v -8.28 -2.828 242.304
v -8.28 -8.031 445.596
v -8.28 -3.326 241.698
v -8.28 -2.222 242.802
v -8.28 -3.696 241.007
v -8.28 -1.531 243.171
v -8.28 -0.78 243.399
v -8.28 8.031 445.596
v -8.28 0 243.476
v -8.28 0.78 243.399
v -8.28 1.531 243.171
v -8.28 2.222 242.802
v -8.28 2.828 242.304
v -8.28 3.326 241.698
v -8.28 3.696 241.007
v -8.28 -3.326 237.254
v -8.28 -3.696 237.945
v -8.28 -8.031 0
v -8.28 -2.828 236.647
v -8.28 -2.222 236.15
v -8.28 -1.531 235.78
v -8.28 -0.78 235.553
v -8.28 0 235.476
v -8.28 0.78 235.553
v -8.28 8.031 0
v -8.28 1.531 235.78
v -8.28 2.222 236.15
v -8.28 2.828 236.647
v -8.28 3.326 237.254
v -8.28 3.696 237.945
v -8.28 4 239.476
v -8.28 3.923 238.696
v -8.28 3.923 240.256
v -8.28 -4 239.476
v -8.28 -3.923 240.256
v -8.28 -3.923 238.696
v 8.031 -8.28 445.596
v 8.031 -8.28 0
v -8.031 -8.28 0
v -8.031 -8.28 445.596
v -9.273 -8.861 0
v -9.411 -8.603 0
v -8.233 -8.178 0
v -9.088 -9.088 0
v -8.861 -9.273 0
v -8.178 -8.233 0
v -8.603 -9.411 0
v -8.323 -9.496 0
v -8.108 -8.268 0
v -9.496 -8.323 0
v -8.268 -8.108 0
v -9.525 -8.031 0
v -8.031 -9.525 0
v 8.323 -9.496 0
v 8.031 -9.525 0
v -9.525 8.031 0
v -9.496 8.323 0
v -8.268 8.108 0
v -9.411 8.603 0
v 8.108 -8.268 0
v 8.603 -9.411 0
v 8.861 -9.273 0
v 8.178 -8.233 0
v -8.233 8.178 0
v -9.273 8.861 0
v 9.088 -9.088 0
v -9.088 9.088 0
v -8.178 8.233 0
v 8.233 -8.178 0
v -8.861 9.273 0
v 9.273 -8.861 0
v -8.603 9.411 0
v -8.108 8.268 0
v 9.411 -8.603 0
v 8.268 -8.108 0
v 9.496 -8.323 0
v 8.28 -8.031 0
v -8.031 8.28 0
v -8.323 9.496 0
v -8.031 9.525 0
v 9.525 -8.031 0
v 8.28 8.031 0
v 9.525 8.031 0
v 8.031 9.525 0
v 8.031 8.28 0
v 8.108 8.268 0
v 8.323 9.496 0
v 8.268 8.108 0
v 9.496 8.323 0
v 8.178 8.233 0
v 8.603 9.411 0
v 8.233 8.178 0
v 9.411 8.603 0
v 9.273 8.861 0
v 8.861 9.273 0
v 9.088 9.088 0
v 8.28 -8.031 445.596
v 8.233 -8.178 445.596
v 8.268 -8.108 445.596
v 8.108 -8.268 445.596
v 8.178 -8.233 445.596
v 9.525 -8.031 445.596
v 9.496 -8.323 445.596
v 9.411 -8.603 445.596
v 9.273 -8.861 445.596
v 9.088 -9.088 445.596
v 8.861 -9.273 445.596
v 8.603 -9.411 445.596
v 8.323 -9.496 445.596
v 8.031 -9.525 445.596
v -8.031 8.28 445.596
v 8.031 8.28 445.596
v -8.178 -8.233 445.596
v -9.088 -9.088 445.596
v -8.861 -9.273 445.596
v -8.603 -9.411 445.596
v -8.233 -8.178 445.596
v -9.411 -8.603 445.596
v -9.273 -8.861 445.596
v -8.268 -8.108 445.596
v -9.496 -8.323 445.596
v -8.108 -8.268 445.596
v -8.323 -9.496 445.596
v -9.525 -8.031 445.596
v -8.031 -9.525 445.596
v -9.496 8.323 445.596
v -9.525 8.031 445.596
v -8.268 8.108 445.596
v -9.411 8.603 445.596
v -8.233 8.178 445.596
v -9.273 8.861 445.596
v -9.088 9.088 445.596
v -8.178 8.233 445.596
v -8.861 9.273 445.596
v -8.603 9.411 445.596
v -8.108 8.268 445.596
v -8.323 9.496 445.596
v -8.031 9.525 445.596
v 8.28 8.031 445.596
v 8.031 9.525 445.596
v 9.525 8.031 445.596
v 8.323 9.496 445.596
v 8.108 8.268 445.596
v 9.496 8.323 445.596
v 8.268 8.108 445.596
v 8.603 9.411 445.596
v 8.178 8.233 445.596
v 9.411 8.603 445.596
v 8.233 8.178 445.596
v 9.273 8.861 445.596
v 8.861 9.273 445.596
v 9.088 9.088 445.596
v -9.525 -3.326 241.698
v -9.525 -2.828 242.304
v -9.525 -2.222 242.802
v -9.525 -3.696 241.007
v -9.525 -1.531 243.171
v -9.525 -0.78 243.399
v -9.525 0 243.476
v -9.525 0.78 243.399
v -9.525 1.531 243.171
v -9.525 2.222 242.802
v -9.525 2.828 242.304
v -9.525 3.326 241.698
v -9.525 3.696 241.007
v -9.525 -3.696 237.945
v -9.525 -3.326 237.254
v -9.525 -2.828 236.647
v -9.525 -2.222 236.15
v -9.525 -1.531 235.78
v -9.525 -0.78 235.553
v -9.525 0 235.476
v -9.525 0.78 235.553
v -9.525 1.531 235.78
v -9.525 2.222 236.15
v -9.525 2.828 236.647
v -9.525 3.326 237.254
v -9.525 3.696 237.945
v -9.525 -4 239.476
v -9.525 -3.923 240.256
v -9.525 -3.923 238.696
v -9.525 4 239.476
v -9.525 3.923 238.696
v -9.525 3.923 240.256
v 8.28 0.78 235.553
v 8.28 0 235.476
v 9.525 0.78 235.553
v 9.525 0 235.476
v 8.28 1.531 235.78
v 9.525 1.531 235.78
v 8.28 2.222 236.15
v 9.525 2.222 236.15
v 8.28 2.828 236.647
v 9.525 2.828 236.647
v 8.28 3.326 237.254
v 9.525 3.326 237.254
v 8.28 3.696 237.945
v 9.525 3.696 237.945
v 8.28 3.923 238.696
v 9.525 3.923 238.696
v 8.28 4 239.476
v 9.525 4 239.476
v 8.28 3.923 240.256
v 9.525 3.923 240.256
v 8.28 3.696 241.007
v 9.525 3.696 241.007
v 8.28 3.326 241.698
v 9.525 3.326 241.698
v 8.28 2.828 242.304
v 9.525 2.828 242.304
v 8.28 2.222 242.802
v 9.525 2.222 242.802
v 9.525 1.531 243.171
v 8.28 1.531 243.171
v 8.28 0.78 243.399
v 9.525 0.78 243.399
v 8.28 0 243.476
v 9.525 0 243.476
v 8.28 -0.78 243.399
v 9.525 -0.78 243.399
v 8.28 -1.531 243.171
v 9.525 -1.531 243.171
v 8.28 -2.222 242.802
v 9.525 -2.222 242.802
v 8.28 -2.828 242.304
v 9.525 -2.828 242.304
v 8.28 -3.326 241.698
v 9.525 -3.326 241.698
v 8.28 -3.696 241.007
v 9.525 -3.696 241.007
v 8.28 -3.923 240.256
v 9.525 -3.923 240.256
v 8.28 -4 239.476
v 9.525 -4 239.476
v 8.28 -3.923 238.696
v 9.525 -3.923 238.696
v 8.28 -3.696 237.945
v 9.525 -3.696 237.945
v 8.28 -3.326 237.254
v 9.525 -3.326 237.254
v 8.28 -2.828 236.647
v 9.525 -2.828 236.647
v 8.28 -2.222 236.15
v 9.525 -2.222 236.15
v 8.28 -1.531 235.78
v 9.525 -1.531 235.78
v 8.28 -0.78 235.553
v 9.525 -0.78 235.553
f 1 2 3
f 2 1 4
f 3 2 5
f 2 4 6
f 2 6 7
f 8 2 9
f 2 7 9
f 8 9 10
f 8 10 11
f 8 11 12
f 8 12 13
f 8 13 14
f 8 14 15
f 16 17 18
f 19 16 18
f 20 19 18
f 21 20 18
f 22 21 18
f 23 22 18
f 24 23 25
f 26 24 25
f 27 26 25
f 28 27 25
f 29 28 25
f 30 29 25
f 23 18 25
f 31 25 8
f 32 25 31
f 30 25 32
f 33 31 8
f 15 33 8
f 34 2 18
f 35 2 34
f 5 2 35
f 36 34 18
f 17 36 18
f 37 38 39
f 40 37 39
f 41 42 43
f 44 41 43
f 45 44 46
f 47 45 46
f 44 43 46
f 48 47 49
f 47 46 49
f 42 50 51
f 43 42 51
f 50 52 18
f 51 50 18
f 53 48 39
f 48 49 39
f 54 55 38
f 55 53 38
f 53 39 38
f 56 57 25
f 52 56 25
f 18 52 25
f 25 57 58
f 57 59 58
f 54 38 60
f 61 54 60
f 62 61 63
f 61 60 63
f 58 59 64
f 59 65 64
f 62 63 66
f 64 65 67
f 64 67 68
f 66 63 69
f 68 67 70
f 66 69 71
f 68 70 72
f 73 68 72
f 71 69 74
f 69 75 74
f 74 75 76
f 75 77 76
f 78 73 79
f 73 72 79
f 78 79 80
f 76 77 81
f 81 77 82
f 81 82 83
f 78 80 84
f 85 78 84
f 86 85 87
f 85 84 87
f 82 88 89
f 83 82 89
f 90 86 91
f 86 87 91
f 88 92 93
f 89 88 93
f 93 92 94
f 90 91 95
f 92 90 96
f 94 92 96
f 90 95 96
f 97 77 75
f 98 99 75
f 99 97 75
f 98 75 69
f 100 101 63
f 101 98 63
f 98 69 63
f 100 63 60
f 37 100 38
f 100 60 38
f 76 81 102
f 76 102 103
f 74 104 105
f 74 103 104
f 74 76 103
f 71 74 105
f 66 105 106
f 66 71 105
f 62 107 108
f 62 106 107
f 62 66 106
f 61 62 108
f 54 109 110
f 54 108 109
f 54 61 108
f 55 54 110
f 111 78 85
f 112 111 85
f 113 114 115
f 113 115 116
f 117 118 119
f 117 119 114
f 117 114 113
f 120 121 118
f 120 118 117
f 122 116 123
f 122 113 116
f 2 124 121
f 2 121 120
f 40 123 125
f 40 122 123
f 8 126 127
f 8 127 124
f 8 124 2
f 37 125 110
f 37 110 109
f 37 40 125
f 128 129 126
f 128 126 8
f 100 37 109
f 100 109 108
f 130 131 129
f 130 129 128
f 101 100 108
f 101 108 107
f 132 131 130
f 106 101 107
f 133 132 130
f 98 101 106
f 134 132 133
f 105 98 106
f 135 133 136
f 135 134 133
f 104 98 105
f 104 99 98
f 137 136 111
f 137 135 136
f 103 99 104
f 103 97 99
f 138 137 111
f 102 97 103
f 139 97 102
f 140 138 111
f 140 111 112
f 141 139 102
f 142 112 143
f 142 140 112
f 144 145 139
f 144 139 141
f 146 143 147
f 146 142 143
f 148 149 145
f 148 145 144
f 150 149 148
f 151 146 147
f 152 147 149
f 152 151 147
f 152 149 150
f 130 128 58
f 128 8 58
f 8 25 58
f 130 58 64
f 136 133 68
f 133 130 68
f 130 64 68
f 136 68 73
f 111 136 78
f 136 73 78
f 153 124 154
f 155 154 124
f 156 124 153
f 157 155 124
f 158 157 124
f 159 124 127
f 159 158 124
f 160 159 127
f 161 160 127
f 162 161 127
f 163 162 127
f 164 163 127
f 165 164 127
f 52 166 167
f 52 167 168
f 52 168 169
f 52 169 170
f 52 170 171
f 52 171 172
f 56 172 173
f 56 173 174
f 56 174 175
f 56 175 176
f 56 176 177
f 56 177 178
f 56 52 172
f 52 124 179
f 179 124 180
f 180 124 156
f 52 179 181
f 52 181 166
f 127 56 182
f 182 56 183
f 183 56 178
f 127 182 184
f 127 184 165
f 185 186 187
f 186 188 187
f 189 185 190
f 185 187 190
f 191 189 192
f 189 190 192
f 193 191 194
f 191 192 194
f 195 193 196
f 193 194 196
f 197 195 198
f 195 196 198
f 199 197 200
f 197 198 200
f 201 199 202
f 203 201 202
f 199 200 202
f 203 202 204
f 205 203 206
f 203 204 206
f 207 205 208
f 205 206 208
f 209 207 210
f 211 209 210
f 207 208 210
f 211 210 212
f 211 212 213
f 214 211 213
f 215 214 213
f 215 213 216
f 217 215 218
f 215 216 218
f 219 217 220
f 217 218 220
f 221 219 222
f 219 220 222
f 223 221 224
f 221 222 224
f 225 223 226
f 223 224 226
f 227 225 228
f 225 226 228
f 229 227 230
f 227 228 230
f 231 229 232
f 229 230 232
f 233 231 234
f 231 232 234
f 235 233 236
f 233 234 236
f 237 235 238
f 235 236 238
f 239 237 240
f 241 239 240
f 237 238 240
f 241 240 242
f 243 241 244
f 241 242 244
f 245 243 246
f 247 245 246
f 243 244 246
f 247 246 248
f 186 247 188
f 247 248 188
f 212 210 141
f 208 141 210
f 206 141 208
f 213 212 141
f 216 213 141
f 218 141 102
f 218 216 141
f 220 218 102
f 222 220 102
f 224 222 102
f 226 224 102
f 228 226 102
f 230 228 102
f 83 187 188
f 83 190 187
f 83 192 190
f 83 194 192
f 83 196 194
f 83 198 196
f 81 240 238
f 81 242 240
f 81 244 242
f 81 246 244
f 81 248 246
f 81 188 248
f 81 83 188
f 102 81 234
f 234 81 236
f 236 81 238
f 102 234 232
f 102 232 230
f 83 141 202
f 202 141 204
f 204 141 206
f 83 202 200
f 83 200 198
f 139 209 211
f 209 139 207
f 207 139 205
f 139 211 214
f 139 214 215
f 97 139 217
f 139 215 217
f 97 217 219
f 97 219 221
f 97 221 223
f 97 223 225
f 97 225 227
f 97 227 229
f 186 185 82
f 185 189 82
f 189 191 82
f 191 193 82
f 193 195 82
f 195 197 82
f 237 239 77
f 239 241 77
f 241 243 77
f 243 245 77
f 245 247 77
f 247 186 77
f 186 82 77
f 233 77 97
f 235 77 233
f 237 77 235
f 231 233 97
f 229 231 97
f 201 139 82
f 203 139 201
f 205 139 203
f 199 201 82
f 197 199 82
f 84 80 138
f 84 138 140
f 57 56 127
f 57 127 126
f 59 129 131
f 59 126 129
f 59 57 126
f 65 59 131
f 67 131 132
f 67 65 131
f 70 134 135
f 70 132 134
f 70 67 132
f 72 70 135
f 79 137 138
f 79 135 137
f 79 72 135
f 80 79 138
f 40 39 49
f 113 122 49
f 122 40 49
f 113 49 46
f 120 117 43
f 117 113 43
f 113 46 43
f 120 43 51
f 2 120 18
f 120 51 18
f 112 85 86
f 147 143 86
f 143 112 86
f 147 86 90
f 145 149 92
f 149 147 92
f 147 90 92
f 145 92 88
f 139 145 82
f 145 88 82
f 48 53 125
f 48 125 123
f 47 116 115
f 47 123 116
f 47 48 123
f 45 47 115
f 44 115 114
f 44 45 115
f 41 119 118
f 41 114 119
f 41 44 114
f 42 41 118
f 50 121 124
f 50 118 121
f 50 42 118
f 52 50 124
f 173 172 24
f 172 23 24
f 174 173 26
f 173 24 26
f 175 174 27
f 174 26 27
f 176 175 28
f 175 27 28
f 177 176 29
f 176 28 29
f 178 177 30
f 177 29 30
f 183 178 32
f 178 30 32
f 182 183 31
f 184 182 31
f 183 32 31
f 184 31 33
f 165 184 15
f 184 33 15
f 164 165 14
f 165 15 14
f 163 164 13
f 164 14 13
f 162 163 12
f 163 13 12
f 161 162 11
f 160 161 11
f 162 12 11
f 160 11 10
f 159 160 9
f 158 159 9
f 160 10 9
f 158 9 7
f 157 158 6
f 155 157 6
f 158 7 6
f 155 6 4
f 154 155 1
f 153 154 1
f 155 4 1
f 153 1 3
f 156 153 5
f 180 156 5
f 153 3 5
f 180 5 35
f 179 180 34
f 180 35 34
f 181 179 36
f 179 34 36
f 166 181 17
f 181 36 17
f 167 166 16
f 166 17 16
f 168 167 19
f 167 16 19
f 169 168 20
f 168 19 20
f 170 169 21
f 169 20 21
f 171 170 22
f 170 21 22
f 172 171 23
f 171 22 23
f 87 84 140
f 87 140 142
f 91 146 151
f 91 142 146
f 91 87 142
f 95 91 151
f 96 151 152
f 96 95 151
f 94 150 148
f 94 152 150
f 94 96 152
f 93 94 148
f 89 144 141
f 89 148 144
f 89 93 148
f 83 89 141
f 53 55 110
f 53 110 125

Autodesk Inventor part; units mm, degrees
ref_plane "YZ Plane" through (0, 0, 0) normal (1, 0, 0) x (0, 1, 0)
ref_plane "Start Plane" through (0, 0, 0) normal (0, 0, 1) x (1, 0, 0)
ref_plane "End Plane" through (0, 0, 445.5965) normal (0, 0, 1) x (1, 0, 0)
sketch "Sketch" plane through (0, 0, 0) normal (0, 0, 1) x (1, 0, 0)
  line L0 (-9.525, -8.0315) -> (-9.525, 8.0315)
  line L1 (-8.0315, 9.525) -> (8.0315, 9.525)
  line L2 (9.525, 8.0315) -> (9.525, -8.0315)
  line L3 (8.0315, -9.525) -> (-8.0315, -9.525)
  arc A0 (-9.525, -8.0315) -> (-8.0315, -9.525) centre (-8.0315, -8.0315) ccw
  arc A1 (-8.0315, 9.525) -> (-9.525, 8.0315) centre (-8.0315, 8.0315) ccw
  arc A2 (9.525, 8.0315) -> (8.0315, 9.525) centre (8.0315, 8.0315) ccw
  arc A3 (8.0315, -9.525) -> (9.525, -8.0315) centre (8.0315, -8.0315) ccw
  arc A4 (-8.0315, 8.2804) -> (-8.2804, 8.0315) centre (-8.0315, 8.0315) ccw
  line L4 (-8.0315, 8.2804) -> (8.0315, 8.2804)
  arc A5 (8.2804, 8.0315) -> (8.0315, 8.2804) centre (8.0315, 8.0315) ccw
  line L5 (8.2804, 8.0315) -> (8.2804, -8.0315)
  arc A6 (8.0315, -8.2804) -> (8.2804, -8.0315) centre (8.0315, -8.0315) ccw
  line L6 (8.0315, -8.2804) -> (-8.0315, -8.2804)
  arc A7 (-8.2804, -8.0315) -> (-8.0315, -8.2804) centre (-8.0315, -8.0315) ccw
  line L7 (-8.2804, -8.0315) -> (-8.2804, 8.0315)
  line L8 (0, 13.768) -> (0, -13.768) construction
  line L9 (-13.8012, 0) -> (13.9669, 0) construction
  dimension "d10" = 19.05
  dimension "d11" = 19.05
  dimension "d12" = 1.2446
  dimension "d15" = 9.525
  dimension "d16" = 9.525
  dimension "d17" = 1.4935
extrude "Body" add sketch "Sketch" along normal up to surface (445.5965 mm away) from surface at 0
sketch "Sketch3" plane through (0, 0, 0) normal (0, 0, 1) x (1, 0, 0)
  line L0 (0, 0) -> (10, 0)
ref_plane "Work Plane3" through (0, 0, 0) normal (0, -1, 0) x (1, 0, 0)
sketch "Sketch5" plane through (9.525, -8.0315, 445.5965) normal (1, 0, 0) x (0, 0, -1)
  line L0 (0, 16.063) -> (0, 0) projected
  line L1 (445.5965, 0) -> (0, 0) projected
  line L2 (445.5965, 16.063) -> (445.5965, 0) projected
  line L3 (445.5965, 16.063) -> (0, 16.063) projected
  circle A0 centre (206.1206, 8.0315) radius 4
  point P0 (445.5965, 8.0315)
  point P1 (445.5965, 8.0315)
  dimension "d20" = 8
extrude "Extrusion2" cut sketch "Sketch5" against normal through all contours A0
sketch "Sketch4" plane through (0, 0, 0) normal (0, -1, 0) x (1, 0, 0)
  line L0 (-2, 0) -> (12, 0) projected
  line L1 (-2, 445.5965) -> (12, 445.5965) projected
  dimension "d19" = 445.5965
equation "\"d10\" = G_H"
equation "\"d11\" = G_W"
equation "\"d12\" = G_T"
equation "\"d15\" = 0.5 * d10"
equation "\"d16\" = 0.5 * d11"
equation "\"d17\" = G_IR"
equation "\"d3\" = G_L"
equation "\"G_W\" = 19.05"
equation "\"G_H\" = 19.05"
equation "\"G_T\" = 1.2446"
equation "\"G_IR\" = 1.2 * G_T"
equation "\"G_L\" = d19"
equation "\"G_OFFSET_START\" = 0"
equation "\"G_OFFSET_END\" = 0"
equation "\"d14\" = G_OFFSET_END + B_L"
equation "\"B_L\" = 445.59646"
properties part number "ASTM A513 - 3/4 x 3/4 x 49/1000 - 17.543" material "Steel, Mild"
